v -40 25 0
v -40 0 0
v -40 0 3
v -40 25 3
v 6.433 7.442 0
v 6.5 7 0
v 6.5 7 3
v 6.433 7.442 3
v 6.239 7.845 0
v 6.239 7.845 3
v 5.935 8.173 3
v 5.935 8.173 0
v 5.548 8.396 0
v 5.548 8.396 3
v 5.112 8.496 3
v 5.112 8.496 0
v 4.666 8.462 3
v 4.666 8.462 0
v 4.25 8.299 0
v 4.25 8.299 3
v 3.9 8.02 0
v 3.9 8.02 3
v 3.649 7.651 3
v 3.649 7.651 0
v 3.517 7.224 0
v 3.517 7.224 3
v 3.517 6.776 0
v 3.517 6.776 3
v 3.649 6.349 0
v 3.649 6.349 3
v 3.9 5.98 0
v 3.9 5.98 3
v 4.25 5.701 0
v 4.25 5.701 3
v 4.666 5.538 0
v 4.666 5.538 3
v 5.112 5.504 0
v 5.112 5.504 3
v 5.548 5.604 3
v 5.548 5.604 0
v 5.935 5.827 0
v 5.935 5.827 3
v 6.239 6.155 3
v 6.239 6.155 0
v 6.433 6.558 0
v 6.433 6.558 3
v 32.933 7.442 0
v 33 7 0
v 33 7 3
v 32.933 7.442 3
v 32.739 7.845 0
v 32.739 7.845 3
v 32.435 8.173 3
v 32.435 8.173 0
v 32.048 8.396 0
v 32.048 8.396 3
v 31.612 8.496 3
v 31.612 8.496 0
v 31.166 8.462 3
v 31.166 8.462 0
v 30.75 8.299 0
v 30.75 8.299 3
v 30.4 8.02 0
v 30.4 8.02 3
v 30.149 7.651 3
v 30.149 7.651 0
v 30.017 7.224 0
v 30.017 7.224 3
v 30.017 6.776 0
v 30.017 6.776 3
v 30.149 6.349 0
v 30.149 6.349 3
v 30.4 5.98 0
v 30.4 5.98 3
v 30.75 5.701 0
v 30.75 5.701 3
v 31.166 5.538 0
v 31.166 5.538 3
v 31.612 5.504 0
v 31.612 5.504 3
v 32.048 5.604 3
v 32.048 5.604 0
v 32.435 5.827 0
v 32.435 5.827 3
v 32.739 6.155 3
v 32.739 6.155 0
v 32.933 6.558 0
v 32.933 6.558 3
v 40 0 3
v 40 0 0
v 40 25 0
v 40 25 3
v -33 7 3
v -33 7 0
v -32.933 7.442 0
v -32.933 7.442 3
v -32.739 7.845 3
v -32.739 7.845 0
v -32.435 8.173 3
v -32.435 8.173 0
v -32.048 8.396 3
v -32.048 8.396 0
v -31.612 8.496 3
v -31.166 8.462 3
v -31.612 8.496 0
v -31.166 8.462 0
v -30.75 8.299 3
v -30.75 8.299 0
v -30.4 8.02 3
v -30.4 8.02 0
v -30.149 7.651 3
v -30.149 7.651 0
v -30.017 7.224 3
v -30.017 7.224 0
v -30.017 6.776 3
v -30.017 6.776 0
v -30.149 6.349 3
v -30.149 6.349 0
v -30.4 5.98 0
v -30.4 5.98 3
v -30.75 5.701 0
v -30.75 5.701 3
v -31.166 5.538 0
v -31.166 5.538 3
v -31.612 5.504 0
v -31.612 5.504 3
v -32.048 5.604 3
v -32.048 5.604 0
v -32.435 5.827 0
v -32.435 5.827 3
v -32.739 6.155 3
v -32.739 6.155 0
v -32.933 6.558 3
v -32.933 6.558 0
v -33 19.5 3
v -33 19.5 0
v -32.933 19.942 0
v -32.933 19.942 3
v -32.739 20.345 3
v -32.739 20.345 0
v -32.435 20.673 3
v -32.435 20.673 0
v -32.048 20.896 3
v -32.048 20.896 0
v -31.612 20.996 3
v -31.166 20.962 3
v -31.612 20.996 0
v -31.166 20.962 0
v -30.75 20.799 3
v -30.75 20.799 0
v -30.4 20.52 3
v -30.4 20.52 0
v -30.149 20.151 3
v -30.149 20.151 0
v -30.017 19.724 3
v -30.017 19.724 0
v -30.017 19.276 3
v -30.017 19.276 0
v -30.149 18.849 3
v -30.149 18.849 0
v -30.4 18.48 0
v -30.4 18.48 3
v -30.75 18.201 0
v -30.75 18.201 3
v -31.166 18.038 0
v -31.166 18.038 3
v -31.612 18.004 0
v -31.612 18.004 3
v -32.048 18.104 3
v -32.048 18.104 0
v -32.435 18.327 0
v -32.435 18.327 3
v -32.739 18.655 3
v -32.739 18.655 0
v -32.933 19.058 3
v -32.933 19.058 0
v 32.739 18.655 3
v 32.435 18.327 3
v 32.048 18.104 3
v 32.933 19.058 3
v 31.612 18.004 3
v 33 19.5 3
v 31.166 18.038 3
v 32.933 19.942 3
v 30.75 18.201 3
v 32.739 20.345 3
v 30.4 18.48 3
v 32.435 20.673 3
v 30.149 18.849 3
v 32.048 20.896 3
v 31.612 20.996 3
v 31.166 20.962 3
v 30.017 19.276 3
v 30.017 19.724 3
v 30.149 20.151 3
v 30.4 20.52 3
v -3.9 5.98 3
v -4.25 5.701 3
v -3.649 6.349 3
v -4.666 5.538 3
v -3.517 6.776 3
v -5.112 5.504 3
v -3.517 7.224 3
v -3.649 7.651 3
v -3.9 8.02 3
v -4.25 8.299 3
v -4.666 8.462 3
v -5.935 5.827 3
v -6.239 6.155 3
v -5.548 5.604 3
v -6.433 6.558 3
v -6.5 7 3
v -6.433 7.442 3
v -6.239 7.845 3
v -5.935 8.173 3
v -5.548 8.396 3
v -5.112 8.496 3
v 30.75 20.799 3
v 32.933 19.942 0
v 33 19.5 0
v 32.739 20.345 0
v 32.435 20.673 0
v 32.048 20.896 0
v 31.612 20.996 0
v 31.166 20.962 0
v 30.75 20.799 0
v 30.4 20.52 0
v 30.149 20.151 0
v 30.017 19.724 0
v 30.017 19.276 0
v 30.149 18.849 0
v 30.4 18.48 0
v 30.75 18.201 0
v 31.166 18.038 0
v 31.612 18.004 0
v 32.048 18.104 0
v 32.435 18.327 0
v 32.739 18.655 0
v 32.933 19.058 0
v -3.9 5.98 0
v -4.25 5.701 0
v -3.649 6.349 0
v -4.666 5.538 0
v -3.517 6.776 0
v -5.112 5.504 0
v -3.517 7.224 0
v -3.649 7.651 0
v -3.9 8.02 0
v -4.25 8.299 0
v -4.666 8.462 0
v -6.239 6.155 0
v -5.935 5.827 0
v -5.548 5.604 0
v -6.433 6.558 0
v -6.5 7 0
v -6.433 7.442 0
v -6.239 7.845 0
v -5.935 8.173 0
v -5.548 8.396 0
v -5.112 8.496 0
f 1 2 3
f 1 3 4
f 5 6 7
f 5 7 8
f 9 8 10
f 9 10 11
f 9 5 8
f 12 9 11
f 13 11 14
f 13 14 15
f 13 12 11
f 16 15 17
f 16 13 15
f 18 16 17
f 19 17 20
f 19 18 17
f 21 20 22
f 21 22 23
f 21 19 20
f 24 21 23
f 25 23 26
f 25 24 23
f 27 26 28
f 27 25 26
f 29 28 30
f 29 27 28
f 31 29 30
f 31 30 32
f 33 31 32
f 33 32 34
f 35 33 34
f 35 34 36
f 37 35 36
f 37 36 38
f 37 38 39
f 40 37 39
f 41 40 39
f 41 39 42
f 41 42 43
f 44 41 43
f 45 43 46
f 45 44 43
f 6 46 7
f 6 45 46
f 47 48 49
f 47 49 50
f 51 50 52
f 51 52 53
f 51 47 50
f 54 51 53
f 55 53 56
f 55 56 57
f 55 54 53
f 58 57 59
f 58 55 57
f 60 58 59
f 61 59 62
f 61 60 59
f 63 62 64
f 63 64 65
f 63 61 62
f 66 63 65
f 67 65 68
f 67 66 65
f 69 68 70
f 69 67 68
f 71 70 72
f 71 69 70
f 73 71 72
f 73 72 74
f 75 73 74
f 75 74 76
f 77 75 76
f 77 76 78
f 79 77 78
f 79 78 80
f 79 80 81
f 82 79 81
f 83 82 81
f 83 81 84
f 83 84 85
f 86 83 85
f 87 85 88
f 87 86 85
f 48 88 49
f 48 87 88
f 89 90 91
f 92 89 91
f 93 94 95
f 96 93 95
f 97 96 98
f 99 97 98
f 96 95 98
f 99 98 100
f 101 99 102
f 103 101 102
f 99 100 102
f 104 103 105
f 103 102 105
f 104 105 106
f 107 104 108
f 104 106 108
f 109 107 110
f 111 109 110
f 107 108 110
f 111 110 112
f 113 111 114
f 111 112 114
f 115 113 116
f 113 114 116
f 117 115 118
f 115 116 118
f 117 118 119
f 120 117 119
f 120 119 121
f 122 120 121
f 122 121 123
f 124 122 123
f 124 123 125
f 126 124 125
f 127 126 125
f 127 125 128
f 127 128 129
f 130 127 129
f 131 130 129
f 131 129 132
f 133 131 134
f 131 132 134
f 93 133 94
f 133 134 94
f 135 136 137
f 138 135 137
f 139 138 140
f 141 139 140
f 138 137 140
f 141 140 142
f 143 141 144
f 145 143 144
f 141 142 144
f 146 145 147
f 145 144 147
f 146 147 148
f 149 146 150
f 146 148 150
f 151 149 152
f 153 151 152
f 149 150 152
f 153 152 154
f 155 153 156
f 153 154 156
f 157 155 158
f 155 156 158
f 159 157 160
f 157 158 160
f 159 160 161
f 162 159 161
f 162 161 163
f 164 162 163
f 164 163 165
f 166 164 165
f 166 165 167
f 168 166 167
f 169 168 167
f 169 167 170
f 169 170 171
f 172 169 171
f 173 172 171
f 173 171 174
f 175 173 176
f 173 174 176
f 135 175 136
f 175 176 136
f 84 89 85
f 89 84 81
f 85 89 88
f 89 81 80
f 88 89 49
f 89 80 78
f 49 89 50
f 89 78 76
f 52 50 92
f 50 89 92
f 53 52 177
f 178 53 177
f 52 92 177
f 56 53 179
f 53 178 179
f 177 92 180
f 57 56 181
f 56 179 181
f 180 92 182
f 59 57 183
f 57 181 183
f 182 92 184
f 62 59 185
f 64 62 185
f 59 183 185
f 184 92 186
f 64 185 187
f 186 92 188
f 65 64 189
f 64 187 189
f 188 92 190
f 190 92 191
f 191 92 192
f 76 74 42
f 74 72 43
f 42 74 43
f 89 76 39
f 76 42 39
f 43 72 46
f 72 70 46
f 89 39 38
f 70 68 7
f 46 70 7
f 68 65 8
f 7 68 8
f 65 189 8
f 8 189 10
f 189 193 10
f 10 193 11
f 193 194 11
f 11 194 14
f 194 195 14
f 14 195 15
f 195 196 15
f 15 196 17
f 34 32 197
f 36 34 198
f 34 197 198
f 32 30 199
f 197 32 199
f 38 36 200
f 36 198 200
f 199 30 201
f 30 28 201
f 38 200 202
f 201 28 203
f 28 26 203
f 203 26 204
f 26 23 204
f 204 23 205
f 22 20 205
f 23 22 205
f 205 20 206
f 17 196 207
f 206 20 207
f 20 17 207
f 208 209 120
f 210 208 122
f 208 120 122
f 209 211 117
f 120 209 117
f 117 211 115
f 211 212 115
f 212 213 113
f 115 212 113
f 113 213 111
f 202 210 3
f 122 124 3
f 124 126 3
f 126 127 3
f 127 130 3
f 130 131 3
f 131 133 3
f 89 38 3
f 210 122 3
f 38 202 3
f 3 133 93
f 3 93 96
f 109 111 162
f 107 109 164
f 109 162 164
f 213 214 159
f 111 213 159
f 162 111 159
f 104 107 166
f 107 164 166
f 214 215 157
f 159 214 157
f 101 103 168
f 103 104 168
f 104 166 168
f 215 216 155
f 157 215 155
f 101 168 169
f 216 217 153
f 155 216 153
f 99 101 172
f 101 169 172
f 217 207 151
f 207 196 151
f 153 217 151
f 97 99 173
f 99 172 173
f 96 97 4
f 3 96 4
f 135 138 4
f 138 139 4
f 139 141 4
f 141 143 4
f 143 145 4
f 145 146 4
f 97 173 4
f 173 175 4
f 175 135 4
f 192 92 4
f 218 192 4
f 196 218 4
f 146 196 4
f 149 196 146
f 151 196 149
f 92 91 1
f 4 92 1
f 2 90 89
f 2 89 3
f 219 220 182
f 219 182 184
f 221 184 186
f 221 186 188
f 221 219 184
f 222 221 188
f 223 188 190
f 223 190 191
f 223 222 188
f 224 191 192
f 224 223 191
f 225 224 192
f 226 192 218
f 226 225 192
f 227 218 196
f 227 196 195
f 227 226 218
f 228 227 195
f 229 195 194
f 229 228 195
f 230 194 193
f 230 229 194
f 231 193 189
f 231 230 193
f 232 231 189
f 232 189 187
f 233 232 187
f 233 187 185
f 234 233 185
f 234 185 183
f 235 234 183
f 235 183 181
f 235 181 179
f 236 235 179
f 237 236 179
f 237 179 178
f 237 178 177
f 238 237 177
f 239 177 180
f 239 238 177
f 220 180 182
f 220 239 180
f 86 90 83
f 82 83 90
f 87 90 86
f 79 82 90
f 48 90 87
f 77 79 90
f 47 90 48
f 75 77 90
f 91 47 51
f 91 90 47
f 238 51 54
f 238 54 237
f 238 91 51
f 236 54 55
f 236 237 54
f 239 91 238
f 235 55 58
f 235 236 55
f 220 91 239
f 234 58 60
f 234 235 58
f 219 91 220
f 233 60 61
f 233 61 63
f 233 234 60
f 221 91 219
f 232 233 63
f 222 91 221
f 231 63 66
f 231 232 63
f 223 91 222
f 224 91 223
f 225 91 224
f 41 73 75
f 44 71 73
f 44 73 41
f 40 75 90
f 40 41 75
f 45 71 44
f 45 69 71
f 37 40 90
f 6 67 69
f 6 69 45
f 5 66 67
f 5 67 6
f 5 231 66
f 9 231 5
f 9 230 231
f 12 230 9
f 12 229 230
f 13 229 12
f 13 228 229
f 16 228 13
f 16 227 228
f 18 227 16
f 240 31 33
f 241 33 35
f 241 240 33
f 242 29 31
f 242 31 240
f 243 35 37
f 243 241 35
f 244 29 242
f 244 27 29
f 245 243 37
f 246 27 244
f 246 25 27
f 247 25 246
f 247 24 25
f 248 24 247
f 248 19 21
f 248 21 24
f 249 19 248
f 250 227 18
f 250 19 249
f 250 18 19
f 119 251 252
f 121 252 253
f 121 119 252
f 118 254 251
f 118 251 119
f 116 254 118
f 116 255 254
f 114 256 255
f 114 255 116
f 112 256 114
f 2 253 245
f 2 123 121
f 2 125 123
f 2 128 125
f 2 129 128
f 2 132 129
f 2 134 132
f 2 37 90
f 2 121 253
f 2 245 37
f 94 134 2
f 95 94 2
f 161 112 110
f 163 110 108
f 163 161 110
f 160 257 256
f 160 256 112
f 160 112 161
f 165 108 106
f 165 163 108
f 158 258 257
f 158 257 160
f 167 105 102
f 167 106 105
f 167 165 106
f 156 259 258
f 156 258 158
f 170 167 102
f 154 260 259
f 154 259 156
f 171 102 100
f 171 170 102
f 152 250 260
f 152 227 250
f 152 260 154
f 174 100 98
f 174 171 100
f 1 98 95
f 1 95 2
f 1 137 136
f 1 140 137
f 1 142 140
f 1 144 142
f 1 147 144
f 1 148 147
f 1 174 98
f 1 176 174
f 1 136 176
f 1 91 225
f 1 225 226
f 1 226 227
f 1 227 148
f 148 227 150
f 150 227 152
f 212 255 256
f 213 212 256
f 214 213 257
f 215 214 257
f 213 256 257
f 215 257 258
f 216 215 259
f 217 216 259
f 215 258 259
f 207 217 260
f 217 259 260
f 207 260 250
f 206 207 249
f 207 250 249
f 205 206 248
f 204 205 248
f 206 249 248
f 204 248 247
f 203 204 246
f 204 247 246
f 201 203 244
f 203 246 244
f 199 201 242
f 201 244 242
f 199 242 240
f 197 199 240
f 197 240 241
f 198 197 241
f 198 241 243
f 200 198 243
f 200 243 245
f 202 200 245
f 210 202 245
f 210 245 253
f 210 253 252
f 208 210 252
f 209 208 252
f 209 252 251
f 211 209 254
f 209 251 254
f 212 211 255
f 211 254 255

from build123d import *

# Parameters (mm, degrees)
SKETCH_W  = 40
SKETCH_H  = 25
SKETCH_R  = 1.5
PAD_DEPTH = 3


with BuildPart() as part:
    # Sketch → Pad (new body)
    with BuildSketch(Plane.XY):
        with Locations((20, 12.5)):
            Rectangle(SKETCH_W, SKETCH_H)
        with Locations((31.5, 19.5)):
            Circle(SKETCH_R, mode=Mode.SUBTRACT)
        with Locations((31.5, 7)):
            Circle(SKETCH_R, mode=Mode.SUBTRACT)
        with Locations((5, 7)):
            Circle(SKETCH_R, mode=Mode.SUBTRACT)
    pad = extrude(amount=PAD_DEPTH)

    # Mirrored: Pad across Sketch V_Axis
    add(pad.mirror(Plane(origin=(0, 0, 0), x_dir=(0, 0, 1), z_dir=(1, 0, 0))))


solid = part.part
